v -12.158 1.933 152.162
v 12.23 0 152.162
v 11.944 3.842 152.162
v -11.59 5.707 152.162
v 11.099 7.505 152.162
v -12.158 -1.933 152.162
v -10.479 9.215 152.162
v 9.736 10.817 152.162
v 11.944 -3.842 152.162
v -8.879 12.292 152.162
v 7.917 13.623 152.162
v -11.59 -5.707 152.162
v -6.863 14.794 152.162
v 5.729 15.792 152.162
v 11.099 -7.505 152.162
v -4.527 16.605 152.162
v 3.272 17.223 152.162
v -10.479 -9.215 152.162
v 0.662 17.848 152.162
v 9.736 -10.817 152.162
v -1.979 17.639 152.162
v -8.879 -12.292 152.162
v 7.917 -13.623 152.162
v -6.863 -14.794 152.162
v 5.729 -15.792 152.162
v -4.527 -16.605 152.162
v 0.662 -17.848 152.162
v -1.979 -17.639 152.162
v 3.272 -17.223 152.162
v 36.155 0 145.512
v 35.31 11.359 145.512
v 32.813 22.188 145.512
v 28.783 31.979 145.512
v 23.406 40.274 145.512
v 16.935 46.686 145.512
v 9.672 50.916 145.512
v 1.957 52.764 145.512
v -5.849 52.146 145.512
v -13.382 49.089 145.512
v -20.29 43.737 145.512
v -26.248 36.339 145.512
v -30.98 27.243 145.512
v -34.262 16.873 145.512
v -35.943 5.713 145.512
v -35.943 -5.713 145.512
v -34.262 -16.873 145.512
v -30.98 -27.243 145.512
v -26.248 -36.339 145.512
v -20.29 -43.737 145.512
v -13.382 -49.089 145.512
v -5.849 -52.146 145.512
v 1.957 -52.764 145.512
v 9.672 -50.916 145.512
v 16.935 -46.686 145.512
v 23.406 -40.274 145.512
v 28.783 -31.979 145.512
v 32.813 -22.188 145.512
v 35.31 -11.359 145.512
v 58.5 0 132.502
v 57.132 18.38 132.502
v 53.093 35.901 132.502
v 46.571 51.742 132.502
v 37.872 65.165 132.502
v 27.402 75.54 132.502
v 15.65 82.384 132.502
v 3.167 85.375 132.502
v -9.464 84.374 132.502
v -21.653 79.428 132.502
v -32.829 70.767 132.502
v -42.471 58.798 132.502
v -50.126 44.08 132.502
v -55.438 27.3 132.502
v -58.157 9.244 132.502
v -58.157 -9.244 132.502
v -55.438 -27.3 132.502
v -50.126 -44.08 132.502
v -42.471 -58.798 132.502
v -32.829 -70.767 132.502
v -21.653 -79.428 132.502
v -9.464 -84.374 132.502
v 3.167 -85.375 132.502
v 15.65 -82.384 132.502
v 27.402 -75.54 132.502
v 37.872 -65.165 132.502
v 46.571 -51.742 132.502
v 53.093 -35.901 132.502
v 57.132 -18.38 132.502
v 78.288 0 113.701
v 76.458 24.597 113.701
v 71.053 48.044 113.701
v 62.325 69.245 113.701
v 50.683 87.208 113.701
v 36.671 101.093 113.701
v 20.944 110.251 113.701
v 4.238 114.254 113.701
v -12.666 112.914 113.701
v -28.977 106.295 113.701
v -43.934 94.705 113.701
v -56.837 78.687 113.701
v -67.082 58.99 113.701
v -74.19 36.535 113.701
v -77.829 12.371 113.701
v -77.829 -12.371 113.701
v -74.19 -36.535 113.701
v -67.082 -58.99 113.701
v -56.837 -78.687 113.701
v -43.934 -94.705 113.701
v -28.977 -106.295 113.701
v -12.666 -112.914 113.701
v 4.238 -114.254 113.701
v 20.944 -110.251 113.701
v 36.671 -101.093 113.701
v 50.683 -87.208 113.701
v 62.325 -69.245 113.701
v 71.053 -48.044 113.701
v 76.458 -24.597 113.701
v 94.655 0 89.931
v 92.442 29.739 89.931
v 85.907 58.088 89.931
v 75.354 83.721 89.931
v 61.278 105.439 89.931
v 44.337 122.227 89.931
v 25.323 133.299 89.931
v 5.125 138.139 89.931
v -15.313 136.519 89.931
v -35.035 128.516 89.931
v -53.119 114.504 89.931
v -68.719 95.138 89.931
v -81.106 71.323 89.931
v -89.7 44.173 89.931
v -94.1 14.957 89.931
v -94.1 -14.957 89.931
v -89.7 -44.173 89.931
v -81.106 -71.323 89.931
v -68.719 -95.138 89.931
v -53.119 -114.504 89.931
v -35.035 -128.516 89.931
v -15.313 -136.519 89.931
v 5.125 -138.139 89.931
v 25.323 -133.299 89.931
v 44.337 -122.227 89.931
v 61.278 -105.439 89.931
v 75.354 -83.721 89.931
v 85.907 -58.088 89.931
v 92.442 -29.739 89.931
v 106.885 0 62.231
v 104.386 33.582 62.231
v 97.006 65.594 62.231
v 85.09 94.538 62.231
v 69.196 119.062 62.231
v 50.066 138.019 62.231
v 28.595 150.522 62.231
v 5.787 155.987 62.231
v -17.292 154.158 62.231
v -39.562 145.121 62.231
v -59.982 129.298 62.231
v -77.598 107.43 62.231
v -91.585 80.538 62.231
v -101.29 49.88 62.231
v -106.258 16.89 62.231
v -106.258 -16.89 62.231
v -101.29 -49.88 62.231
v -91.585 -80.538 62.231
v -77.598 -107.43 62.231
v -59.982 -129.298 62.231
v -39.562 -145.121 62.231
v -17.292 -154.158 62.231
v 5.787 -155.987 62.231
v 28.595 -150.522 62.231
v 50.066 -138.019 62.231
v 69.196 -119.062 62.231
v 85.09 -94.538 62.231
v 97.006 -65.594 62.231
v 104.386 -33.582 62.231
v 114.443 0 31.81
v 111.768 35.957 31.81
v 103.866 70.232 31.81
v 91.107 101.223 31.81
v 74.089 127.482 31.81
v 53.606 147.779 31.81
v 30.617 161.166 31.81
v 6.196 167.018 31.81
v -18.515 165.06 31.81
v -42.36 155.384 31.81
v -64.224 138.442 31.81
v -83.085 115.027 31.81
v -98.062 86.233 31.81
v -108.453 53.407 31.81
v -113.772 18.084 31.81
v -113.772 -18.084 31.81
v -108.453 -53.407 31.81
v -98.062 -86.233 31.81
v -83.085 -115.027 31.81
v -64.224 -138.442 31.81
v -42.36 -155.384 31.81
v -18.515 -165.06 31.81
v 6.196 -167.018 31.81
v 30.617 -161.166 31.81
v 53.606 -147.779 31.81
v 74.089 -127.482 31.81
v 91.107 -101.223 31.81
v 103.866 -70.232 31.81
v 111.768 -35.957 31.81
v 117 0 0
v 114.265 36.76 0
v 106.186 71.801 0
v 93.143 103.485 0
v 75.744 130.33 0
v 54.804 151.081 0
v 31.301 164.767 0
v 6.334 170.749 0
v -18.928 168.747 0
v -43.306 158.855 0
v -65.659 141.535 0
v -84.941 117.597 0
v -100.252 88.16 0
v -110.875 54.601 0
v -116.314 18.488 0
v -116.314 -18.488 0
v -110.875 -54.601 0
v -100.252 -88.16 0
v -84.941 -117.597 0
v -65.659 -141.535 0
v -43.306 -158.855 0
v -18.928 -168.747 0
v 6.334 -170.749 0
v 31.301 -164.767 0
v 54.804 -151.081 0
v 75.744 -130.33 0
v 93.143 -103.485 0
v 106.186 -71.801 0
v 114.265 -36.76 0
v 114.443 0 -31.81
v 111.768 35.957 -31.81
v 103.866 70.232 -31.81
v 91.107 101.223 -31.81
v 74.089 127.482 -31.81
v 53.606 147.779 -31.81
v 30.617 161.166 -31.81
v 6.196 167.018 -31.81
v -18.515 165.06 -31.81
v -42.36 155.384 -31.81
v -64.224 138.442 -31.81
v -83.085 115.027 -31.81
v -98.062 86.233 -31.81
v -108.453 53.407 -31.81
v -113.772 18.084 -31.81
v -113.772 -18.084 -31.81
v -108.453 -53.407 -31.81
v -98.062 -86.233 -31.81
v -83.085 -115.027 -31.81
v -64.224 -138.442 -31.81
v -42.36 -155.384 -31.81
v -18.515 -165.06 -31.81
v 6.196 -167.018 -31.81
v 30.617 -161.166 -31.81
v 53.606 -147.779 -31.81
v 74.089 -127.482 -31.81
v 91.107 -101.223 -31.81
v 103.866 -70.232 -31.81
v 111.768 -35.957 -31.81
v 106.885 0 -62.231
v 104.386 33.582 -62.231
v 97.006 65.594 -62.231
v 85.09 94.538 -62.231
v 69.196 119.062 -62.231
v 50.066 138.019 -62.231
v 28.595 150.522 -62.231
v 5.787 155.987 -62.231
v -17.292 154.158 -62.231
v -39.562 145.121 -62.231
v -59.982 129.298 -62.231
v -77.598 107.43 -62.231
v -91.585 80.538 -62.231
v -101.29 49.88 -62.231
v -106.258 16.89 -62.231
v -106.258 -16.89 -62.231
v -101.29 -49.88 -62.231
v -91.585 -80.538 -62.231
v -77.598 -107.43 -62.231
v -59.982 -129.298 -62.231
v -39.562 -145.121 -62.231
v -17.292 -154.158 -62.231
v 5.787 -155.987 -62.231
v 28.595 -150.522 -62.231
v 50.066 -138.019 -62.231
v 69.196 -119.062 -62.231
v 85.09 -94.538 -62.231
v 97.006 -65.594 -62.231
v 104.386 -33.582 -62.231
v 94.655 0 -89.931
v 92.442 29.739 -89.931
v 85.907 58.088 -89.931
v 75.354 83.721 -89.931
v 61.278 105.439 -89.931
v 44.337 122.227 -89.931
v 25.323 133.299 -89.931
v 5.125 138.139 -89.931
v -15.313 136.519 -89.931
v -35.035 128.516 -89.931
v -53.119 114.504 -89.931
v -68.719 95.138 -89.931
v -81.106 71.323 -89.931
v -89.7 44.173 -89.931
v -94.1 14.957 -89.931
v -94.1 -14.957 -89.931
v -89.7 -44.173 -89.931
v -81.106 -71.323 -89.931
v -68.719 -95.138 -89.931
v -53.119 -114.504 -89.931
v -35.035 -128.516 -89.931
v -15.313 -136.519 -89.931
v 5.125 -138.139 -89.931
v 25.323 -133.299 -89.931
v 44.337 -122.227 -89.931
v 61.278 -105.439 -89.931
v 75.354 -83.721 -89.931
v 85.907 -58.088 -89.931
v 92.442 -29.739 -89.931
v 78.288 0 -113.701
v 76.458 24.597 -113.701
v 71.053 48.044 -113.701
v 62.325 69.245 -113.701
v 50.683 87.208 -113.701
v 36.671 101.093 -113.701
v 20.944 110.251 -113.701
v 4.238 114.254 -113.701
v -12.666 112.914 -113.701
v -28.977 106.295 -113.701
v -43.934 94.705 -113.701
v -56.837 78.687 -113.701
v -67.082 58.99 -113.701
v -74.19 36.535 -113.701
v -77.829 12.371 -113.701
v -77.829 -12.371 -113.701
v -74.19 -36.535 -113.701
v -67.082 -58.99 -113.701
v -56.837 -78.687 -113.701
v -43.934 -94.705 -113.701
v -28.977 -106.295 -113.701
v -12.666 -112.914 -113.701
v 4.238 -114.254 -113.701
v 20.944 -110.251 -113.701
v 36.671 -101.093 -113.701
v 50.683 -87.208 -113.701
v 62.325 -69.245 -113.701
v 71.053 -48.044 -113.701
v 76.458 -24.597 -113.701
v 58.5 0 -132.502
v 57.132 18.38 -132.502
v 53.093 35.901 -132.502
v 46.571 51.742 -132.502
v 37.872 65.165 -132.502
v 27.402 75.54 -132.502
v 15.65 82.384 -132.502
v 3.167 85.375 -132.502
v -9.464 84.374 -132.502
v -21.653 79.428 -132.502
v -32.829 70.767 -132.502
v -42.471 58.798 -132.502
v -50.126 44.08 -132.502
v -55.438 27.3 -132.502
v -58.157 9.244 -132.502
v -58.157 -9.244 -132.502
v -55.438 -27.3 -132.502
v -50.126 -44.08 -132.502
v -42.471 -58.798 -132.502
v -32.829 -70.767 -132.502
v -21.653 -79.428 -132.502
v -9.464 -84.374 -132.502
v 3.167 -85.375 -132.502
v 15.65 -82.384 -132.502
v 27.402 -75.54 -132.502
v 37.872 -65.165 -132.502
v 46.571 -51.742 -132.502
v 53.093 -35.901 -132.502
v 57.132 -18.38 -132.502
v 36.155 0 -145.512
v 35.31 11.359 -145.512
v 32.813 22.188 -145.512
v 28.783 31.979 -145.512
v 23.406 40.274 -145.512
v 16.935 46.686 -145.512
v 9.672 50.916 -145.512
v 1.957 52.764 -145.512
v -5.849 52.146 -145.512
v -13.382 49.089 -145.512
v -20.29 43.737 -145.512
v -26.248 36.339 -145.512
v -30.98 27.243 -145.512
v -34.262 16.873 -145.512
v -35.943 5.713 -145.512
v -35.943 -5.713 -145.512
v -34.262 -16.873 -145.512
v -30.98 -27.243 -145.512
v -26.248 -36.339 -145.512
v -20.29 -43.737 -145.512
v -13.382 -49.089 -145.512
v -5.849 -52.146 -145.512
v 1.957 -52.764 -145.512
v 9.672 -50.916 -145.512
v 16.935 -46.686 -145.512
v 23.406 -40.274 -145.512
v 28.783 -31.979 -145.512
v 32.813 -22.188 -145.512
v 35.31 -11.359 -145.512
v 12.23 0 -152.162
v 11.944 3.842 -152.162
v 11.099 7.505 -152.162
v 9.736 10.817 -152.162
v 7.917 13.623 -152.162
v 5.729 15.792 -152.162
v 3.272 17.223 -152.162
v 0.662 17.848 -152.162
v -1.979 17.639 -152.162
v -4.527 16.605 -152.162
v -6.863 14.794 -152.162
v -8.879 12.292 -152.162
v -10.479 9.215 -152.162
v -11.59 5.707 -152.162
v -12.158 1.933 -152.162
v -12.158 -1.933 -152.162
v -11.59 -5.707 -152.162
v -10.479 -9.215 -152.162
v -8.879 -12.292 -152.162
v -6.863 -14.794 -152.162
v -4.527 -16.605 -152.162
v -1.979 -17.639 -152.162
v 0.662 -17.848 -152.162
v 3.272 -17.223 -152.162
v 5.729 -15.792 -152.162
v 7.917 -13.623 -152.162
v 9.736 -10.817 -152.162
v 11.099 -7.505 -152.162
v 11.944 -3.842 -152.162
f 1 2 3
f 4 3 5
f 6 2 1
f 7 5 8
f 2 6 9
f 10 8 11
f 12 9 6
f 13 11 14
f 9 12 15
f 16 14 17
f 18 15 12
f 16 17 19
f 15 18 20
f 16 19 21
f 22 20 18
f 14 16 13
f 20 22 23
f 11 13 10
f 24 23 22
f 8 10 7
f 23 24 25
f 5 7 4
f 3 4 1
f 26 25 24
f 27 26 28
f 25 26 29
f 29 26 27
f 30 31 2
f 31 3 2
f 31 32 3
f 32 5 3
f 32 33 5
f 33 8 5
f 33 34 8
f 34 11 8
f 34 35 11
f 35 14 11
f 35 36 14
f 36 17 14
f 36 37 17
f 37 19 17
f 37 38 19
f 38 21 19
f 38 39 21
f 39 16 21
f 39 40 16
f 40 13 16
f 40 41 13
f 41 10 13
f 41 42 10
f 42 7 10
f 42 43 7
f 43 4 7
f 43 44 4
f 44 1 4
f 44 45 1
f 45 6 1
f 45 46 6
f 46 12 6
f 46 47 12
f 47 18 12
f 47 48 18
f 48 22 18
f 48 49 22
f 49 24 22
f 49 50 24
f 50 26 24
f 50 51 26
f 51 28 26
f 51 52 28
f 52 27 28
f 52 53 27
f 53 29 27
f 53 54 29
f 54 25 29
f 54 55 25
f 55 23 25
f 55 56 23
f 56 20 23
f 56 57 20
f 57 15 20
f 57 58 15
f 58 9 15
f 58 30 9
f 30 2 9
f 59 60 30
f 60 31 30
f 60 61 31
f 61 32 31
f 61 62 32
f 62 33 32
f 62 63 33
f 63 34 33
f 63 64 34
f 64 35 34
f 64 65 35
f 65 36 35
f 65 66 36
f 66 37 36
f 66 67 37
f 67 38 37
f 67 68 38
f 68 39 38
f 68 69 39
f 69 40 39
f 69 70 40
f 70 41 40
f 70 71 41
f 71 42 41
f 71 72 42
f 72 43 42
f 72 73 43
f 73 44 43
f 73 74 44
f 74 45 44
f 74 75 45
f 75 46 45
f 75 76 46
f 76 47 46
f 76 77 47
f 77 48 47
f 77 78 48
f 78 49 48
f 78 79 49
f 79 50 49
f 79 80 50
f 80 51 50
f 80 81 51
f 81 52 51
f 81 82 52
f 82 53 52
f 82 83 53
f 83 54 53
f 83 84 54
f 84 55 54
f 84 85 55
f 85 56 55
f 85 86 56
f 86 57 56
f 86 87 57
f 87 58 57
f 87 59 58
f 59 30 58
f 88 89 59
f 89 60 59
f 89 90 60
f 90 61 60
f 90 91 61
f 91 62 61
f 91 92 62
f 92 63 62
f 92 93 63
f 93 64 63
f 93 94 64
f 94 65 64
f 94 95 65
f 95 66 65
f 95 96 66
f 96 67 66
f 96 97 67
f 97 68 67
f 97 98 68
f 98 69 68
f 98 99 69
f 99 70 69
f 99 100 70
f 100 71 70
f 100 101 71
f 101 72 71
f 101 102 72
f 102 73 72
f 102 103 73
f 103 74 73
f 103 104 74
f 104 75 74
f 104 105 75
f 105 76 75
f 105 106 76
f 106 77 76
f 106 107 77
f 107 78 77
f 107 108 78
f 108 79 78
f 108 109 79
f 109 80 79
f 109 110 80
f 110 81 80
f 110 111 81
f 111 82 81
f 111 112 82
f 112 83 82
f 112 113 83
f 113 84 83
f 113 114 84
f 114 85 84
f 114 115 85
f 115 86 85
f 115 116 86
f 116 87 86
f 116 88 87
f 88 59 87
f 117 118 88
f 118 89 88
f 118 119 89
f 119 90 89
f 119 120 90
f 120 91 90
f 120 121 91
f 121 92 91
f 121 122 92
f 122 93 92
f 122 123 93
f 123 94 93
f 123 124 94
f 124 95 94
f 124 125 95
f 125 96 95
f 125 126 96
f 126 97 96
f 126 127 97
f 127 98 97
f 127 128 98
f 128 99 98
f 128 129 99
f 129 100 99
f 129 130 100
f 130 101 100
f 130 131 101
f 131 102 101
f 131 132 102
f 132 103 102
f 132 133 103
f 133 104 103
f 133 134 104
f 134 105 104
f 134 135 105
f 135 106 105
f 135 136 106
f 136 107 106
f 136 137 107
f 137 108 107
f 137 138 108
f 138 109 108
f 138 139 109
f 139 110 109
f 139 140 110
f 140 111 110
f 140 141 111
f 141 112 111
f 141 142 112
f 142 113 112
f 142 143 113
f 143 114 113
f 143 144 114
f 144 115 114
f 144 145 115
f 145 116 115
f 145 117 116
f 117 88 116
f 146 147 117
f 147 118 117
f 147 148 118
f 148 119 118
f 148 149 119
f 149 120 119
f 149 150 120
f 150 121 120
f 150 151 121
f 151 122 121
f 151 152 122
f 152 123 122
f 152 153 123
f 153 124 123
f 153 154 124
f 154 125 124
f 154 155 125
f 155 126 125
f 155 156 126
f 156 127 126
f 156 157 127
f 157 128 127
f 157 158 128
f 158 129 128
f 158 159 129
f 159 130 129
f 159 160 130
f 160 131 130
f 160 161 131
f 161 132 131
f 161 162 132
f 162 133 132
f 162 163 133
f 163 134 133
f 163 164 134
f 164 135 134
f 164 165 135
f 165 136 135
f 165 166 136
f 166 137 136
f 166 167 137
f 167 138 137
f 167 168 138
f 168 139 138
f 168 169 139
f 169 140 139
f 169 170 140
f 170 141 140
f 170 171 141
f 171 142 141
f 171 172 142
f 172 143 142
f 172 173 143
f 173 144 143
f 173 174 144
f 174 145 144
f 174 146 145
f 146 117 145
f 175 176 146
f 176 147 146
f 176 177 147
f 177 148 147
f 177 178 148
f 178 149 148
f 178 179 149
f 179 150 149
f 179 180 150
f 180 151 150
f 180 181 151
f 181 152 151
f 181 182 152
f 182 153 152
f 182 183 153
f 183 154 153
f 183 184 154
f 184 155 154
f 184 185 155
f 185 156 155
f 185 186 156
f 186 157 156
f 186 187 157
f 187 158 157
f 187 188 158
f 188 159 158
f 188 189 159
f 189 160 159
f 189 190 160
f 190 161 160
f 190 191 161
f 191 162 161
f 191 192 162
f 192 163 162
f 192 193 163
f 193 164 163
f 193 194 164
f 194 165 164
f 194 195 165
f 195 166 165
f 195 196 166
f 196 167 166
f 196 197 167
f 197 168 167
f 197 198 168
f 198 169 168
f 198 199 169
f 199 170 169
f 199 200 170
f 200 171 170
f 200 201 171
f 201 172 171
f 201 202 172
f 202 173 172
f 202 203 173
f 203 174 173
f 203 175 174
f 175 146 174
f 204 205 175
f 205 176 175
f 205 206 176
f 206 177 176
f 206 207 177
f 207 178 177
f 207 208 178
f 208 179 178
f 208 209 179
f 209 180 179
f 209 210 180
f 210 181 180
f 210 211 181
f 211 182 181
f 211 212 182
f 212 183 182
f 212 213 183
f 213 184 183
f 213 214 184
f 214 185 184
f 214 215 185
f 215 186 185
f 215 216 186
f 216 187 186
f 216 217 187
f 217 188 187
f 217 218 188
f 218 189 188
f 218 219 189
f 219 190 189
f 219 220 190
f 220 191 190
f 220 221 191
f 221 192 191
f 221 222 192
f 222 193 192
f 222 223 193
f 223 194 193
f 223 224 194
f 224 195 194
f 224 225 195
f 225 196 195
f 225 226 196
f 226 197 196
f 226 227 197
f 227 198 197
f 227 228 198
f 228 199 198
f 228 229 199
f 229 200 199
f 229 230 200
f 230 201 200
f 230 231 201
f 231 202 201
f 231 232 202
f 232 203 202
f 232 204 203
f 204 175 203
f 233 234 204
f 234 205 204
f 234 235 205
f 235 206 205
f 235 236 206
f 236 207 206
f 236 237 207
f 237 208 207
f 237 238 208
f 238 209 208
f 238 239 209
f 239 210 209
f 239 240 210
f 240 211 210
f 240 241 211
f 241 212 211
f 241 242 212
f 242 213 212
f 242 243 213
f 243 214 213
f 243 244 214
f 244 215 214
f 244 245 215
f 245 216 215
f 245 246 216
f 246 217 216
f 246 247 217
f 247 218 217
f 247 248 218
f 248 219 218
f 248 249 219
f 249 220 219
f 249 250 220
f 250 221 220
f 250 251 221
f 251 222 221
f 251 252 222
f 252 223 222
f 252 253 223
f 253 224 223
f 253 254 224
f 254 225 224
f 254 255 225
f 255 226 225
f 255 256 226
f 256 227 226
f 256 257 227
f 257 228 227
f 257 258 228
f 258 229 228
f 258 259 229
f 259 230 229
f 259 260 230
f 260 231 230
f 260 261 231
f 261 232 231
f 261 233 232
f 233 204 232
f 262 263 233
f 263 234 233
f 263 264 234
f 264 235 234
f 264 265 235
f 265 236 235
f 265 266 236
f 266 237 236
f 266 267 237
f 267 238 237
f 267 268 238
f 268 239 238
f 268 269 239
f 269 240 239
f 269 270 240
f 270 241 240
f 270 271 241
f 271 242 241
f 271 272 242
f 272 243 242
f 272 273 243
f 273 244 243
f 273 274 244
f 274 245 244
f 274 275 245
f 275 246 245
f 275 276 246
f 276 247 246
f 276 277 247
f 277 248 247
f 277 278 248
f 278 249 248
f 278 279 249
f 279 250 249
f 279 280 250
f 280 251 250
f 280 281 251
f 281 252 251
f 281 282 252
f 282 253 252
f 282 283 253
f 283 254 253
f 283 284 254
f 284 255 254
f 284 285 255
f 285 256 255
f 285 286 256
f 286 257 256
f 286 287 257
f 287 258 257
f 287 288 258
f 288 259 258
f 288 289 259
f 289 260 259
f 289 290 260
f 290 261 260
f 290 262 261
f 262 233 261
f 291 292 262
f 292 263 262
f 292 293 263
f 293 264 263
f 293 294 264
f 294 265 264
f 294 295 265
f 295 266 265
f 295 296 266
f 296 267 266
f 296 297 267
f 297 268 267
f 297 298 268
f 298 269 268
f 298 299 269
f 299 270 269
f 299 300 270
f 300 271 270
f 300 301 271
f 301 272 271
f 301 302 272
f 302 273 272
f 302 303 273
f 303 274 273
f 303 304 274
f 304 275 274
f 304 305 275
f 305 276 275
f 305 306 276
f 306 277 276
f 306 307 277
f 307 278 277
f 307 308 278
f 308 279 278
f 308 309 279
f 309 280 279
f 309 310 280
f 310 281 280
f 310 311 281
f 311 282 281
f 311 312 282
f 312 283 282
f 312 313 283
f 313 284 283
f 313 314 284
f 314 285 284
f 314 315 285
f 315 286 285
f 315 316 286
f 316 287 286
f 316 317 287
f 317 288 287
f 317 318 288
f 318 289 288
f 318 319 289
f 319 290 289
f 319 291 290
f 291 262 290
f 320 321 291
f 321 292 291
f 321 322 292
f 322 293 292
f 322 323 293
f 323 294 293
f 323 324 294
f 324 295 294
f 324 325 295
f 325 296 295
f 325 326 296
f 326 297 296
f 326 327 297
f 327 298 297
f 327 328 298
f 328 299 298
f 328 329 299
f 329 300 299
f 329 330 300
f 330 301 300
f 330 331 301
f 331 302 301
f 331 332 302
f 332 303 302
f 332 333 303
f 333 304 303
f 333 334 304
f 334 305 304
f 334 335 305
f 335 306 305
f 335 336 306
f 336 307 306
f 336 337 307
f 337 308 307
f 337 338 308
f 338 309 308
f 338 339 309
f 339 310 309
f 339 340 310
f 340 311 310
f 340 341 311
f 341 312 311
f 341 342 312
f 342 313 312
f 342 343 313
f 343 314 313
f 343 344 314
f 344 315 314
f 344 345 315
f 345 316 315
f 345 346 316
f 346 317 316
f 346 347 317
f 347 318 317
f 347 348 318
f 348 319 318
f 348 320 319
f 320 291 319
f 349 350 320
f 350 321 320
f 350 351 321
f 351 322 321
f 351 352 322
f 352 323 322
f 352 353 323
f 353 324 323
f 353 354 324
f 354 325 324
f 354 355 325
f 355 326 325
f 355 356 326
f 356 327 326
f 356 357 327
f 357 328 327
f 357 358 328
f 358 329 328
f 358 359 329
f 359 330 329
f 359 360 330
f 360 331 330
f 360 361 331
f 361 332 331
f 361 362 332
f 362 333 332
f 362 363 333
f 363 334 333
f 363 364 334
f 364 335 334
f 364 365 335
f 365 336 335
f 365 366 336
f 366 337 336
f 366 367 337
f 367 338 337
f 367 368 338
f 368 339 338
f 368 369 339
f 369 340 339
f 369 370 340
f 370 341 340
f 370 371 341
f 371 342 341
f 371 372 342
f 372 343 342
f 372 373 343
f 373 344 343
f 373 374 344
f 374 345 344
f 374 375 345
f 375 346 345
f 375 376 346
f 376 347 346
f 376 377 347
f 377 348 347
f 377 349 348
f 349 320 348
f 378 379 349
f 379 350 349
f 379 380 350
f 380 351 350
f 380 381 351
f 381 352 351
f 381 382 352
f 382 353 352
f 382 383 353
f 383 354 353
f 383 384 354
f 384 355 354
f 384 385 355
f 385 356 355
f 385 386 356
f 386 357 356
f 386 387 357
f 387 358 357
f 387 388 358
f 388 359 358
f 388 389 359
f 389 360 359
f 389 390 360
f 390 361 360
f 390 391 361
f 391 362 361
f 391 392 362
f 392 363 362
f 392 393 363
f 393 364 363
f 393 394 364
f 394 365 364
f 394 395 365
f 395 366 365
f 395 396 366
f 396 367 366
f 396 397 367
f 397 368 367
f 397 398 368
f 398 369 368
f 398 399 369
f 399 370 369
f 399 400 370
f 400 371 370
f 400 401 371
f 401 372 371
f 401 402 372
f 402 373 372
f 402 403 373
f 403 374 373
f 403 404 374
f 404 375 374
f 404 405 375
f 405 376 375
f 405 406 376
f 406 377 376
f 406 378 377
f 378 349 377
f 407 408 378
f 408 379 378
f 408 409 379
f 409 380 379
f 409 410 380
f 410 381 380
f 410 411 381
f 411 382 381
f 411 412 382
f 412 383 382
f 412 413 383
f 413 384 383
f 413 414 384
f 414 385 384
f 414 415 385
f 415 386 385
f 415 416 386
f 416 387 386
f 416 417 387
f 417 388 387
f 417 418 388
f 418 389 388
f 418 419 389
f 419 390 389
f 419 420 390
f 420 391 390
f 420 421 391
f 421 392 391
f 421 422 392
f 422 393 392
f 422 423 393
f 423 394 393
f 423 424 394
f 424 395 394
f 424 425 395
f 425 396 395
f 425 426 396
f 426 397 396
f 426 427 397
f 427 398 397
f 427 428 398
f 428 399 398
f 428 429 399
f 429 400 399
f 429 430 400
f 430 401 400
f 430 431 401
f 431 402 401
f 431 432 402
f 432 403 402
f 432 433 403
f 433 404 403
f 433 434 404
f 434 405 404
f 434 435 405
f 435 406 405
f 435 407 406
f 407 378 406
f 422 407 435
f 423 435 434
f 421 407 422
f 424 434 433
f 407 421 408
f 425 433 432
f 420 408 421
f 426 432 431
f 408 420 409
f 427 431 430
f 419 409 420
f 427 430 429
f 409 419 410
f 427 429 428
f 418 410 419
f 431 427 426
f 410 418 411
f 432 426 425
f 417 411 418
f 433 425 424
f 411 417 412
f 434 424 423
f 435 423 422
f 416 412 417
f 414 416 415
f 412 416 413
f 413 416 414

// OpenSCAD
// Generated by SolidPython 1.0.1 on 2020-07-29 00:46:51


scale(v = [13, 19, 17]) {
	sphere(r = 9);
}
/***********************************************
*********      SolidPython code:      **********
************************************************
 
# import packages: SolidPython
from solid import *
from solid.utils import *
from itertools import chain, combinations, permutations


class Resize:

    def __init__(self, scad_file):
        self.scad_file = scad_file
        #self.scad_file = import_scad(scad_file)
        # cone/cylinder param:
        self.r1 = 0
        self.r2 = 0
        self.h = 0
        # rectangular prism param:
        self.w = 0
        self.l = 0
        # ellipse param:
        self.r = 0

    # import OpenScad code (file name corresponds to shape)


    # classify shape + parameters
    def assign(self, param1, param2, param3):
        if self.scad_file == 'cone.scad':
            self.r1 = param1
            self.r2 = param2
            self.h = param3
        elif self.scad_file == 'cylinder.scad':
            self.r1 = param1
            self.r2 = param2
            self.h = param3
        elif self.scad_file == 'rectangularPrism.scad':
            self.h = param1
            self.l = param2
            self.w = param3
        else:
            self.r = param1
            self.h = param2

    # resize parameters
    def iterate(self):
        x = range(3, 20, 2)
        i = 1
        if self.scad_file == 'cone.scad':
            tempList = list(permutations(x, 2))
            for temp in tempList:
                param1 = temp[0]
                param2 = temp[1]
                filepath = 'produced_scad_files/' + 'cone' + str(param1) + '_' + str(param2) + '_' + '.scad'
                scad_render_to_file(cylinder(h=param1, r1=param2, r2=0), filepath)

        elif self.scad_file == 'cylinder.scad':
            tempList = list(permutations(x, 3))
            for temp in tempList:
                param1 = temp[0]
                param2 = temp[1]
                filepath = 'produced_scad_files/' + 'cylinder' + str(param1) + '_' + str(param2) + '_' + '.scad'
                scad_render_to_file(cylinder(h=param1, r1=param2, r2=param2), filepath)

        elif self.scad_file == 'rectangularPrism.scad':
            tempList = list(permutations(x, 3))
            for temp in tempList:
                param1 = temp[0]
                param2 = temp[1]
                param3 = temp[2]
                filepath = 'produced_scad_files/' + 'rectangularPrism' + str(param1) + '_' + str(param2) + '_' + str(
                    param3) + '.scad'
                scad_render_to_file(cube(size=(param1, param2, param3)), filepath)

        elif self.scad_file == 'ellipse.scad':
            tempList = list(permutations(x, 4))
            for temp in tempList:
                param1 = temp[0]
                param2 = temp[1]
                param3 = temp[2]
                param4 = temp[3]
                filepath = 'produced_scad_files/' + 'ellipse' + str(param1) + '_' + str(param2) + '_' + str(param3) + '_' + str(param4) + '.scad'
                scad_render_to_file(scale([param1, param2, param3])(sphere(r=param4)), filepath)

    def render_to_scadfile(self):
        scad_render_to_file(scad, 'example.scad') 
 
************************************************/
